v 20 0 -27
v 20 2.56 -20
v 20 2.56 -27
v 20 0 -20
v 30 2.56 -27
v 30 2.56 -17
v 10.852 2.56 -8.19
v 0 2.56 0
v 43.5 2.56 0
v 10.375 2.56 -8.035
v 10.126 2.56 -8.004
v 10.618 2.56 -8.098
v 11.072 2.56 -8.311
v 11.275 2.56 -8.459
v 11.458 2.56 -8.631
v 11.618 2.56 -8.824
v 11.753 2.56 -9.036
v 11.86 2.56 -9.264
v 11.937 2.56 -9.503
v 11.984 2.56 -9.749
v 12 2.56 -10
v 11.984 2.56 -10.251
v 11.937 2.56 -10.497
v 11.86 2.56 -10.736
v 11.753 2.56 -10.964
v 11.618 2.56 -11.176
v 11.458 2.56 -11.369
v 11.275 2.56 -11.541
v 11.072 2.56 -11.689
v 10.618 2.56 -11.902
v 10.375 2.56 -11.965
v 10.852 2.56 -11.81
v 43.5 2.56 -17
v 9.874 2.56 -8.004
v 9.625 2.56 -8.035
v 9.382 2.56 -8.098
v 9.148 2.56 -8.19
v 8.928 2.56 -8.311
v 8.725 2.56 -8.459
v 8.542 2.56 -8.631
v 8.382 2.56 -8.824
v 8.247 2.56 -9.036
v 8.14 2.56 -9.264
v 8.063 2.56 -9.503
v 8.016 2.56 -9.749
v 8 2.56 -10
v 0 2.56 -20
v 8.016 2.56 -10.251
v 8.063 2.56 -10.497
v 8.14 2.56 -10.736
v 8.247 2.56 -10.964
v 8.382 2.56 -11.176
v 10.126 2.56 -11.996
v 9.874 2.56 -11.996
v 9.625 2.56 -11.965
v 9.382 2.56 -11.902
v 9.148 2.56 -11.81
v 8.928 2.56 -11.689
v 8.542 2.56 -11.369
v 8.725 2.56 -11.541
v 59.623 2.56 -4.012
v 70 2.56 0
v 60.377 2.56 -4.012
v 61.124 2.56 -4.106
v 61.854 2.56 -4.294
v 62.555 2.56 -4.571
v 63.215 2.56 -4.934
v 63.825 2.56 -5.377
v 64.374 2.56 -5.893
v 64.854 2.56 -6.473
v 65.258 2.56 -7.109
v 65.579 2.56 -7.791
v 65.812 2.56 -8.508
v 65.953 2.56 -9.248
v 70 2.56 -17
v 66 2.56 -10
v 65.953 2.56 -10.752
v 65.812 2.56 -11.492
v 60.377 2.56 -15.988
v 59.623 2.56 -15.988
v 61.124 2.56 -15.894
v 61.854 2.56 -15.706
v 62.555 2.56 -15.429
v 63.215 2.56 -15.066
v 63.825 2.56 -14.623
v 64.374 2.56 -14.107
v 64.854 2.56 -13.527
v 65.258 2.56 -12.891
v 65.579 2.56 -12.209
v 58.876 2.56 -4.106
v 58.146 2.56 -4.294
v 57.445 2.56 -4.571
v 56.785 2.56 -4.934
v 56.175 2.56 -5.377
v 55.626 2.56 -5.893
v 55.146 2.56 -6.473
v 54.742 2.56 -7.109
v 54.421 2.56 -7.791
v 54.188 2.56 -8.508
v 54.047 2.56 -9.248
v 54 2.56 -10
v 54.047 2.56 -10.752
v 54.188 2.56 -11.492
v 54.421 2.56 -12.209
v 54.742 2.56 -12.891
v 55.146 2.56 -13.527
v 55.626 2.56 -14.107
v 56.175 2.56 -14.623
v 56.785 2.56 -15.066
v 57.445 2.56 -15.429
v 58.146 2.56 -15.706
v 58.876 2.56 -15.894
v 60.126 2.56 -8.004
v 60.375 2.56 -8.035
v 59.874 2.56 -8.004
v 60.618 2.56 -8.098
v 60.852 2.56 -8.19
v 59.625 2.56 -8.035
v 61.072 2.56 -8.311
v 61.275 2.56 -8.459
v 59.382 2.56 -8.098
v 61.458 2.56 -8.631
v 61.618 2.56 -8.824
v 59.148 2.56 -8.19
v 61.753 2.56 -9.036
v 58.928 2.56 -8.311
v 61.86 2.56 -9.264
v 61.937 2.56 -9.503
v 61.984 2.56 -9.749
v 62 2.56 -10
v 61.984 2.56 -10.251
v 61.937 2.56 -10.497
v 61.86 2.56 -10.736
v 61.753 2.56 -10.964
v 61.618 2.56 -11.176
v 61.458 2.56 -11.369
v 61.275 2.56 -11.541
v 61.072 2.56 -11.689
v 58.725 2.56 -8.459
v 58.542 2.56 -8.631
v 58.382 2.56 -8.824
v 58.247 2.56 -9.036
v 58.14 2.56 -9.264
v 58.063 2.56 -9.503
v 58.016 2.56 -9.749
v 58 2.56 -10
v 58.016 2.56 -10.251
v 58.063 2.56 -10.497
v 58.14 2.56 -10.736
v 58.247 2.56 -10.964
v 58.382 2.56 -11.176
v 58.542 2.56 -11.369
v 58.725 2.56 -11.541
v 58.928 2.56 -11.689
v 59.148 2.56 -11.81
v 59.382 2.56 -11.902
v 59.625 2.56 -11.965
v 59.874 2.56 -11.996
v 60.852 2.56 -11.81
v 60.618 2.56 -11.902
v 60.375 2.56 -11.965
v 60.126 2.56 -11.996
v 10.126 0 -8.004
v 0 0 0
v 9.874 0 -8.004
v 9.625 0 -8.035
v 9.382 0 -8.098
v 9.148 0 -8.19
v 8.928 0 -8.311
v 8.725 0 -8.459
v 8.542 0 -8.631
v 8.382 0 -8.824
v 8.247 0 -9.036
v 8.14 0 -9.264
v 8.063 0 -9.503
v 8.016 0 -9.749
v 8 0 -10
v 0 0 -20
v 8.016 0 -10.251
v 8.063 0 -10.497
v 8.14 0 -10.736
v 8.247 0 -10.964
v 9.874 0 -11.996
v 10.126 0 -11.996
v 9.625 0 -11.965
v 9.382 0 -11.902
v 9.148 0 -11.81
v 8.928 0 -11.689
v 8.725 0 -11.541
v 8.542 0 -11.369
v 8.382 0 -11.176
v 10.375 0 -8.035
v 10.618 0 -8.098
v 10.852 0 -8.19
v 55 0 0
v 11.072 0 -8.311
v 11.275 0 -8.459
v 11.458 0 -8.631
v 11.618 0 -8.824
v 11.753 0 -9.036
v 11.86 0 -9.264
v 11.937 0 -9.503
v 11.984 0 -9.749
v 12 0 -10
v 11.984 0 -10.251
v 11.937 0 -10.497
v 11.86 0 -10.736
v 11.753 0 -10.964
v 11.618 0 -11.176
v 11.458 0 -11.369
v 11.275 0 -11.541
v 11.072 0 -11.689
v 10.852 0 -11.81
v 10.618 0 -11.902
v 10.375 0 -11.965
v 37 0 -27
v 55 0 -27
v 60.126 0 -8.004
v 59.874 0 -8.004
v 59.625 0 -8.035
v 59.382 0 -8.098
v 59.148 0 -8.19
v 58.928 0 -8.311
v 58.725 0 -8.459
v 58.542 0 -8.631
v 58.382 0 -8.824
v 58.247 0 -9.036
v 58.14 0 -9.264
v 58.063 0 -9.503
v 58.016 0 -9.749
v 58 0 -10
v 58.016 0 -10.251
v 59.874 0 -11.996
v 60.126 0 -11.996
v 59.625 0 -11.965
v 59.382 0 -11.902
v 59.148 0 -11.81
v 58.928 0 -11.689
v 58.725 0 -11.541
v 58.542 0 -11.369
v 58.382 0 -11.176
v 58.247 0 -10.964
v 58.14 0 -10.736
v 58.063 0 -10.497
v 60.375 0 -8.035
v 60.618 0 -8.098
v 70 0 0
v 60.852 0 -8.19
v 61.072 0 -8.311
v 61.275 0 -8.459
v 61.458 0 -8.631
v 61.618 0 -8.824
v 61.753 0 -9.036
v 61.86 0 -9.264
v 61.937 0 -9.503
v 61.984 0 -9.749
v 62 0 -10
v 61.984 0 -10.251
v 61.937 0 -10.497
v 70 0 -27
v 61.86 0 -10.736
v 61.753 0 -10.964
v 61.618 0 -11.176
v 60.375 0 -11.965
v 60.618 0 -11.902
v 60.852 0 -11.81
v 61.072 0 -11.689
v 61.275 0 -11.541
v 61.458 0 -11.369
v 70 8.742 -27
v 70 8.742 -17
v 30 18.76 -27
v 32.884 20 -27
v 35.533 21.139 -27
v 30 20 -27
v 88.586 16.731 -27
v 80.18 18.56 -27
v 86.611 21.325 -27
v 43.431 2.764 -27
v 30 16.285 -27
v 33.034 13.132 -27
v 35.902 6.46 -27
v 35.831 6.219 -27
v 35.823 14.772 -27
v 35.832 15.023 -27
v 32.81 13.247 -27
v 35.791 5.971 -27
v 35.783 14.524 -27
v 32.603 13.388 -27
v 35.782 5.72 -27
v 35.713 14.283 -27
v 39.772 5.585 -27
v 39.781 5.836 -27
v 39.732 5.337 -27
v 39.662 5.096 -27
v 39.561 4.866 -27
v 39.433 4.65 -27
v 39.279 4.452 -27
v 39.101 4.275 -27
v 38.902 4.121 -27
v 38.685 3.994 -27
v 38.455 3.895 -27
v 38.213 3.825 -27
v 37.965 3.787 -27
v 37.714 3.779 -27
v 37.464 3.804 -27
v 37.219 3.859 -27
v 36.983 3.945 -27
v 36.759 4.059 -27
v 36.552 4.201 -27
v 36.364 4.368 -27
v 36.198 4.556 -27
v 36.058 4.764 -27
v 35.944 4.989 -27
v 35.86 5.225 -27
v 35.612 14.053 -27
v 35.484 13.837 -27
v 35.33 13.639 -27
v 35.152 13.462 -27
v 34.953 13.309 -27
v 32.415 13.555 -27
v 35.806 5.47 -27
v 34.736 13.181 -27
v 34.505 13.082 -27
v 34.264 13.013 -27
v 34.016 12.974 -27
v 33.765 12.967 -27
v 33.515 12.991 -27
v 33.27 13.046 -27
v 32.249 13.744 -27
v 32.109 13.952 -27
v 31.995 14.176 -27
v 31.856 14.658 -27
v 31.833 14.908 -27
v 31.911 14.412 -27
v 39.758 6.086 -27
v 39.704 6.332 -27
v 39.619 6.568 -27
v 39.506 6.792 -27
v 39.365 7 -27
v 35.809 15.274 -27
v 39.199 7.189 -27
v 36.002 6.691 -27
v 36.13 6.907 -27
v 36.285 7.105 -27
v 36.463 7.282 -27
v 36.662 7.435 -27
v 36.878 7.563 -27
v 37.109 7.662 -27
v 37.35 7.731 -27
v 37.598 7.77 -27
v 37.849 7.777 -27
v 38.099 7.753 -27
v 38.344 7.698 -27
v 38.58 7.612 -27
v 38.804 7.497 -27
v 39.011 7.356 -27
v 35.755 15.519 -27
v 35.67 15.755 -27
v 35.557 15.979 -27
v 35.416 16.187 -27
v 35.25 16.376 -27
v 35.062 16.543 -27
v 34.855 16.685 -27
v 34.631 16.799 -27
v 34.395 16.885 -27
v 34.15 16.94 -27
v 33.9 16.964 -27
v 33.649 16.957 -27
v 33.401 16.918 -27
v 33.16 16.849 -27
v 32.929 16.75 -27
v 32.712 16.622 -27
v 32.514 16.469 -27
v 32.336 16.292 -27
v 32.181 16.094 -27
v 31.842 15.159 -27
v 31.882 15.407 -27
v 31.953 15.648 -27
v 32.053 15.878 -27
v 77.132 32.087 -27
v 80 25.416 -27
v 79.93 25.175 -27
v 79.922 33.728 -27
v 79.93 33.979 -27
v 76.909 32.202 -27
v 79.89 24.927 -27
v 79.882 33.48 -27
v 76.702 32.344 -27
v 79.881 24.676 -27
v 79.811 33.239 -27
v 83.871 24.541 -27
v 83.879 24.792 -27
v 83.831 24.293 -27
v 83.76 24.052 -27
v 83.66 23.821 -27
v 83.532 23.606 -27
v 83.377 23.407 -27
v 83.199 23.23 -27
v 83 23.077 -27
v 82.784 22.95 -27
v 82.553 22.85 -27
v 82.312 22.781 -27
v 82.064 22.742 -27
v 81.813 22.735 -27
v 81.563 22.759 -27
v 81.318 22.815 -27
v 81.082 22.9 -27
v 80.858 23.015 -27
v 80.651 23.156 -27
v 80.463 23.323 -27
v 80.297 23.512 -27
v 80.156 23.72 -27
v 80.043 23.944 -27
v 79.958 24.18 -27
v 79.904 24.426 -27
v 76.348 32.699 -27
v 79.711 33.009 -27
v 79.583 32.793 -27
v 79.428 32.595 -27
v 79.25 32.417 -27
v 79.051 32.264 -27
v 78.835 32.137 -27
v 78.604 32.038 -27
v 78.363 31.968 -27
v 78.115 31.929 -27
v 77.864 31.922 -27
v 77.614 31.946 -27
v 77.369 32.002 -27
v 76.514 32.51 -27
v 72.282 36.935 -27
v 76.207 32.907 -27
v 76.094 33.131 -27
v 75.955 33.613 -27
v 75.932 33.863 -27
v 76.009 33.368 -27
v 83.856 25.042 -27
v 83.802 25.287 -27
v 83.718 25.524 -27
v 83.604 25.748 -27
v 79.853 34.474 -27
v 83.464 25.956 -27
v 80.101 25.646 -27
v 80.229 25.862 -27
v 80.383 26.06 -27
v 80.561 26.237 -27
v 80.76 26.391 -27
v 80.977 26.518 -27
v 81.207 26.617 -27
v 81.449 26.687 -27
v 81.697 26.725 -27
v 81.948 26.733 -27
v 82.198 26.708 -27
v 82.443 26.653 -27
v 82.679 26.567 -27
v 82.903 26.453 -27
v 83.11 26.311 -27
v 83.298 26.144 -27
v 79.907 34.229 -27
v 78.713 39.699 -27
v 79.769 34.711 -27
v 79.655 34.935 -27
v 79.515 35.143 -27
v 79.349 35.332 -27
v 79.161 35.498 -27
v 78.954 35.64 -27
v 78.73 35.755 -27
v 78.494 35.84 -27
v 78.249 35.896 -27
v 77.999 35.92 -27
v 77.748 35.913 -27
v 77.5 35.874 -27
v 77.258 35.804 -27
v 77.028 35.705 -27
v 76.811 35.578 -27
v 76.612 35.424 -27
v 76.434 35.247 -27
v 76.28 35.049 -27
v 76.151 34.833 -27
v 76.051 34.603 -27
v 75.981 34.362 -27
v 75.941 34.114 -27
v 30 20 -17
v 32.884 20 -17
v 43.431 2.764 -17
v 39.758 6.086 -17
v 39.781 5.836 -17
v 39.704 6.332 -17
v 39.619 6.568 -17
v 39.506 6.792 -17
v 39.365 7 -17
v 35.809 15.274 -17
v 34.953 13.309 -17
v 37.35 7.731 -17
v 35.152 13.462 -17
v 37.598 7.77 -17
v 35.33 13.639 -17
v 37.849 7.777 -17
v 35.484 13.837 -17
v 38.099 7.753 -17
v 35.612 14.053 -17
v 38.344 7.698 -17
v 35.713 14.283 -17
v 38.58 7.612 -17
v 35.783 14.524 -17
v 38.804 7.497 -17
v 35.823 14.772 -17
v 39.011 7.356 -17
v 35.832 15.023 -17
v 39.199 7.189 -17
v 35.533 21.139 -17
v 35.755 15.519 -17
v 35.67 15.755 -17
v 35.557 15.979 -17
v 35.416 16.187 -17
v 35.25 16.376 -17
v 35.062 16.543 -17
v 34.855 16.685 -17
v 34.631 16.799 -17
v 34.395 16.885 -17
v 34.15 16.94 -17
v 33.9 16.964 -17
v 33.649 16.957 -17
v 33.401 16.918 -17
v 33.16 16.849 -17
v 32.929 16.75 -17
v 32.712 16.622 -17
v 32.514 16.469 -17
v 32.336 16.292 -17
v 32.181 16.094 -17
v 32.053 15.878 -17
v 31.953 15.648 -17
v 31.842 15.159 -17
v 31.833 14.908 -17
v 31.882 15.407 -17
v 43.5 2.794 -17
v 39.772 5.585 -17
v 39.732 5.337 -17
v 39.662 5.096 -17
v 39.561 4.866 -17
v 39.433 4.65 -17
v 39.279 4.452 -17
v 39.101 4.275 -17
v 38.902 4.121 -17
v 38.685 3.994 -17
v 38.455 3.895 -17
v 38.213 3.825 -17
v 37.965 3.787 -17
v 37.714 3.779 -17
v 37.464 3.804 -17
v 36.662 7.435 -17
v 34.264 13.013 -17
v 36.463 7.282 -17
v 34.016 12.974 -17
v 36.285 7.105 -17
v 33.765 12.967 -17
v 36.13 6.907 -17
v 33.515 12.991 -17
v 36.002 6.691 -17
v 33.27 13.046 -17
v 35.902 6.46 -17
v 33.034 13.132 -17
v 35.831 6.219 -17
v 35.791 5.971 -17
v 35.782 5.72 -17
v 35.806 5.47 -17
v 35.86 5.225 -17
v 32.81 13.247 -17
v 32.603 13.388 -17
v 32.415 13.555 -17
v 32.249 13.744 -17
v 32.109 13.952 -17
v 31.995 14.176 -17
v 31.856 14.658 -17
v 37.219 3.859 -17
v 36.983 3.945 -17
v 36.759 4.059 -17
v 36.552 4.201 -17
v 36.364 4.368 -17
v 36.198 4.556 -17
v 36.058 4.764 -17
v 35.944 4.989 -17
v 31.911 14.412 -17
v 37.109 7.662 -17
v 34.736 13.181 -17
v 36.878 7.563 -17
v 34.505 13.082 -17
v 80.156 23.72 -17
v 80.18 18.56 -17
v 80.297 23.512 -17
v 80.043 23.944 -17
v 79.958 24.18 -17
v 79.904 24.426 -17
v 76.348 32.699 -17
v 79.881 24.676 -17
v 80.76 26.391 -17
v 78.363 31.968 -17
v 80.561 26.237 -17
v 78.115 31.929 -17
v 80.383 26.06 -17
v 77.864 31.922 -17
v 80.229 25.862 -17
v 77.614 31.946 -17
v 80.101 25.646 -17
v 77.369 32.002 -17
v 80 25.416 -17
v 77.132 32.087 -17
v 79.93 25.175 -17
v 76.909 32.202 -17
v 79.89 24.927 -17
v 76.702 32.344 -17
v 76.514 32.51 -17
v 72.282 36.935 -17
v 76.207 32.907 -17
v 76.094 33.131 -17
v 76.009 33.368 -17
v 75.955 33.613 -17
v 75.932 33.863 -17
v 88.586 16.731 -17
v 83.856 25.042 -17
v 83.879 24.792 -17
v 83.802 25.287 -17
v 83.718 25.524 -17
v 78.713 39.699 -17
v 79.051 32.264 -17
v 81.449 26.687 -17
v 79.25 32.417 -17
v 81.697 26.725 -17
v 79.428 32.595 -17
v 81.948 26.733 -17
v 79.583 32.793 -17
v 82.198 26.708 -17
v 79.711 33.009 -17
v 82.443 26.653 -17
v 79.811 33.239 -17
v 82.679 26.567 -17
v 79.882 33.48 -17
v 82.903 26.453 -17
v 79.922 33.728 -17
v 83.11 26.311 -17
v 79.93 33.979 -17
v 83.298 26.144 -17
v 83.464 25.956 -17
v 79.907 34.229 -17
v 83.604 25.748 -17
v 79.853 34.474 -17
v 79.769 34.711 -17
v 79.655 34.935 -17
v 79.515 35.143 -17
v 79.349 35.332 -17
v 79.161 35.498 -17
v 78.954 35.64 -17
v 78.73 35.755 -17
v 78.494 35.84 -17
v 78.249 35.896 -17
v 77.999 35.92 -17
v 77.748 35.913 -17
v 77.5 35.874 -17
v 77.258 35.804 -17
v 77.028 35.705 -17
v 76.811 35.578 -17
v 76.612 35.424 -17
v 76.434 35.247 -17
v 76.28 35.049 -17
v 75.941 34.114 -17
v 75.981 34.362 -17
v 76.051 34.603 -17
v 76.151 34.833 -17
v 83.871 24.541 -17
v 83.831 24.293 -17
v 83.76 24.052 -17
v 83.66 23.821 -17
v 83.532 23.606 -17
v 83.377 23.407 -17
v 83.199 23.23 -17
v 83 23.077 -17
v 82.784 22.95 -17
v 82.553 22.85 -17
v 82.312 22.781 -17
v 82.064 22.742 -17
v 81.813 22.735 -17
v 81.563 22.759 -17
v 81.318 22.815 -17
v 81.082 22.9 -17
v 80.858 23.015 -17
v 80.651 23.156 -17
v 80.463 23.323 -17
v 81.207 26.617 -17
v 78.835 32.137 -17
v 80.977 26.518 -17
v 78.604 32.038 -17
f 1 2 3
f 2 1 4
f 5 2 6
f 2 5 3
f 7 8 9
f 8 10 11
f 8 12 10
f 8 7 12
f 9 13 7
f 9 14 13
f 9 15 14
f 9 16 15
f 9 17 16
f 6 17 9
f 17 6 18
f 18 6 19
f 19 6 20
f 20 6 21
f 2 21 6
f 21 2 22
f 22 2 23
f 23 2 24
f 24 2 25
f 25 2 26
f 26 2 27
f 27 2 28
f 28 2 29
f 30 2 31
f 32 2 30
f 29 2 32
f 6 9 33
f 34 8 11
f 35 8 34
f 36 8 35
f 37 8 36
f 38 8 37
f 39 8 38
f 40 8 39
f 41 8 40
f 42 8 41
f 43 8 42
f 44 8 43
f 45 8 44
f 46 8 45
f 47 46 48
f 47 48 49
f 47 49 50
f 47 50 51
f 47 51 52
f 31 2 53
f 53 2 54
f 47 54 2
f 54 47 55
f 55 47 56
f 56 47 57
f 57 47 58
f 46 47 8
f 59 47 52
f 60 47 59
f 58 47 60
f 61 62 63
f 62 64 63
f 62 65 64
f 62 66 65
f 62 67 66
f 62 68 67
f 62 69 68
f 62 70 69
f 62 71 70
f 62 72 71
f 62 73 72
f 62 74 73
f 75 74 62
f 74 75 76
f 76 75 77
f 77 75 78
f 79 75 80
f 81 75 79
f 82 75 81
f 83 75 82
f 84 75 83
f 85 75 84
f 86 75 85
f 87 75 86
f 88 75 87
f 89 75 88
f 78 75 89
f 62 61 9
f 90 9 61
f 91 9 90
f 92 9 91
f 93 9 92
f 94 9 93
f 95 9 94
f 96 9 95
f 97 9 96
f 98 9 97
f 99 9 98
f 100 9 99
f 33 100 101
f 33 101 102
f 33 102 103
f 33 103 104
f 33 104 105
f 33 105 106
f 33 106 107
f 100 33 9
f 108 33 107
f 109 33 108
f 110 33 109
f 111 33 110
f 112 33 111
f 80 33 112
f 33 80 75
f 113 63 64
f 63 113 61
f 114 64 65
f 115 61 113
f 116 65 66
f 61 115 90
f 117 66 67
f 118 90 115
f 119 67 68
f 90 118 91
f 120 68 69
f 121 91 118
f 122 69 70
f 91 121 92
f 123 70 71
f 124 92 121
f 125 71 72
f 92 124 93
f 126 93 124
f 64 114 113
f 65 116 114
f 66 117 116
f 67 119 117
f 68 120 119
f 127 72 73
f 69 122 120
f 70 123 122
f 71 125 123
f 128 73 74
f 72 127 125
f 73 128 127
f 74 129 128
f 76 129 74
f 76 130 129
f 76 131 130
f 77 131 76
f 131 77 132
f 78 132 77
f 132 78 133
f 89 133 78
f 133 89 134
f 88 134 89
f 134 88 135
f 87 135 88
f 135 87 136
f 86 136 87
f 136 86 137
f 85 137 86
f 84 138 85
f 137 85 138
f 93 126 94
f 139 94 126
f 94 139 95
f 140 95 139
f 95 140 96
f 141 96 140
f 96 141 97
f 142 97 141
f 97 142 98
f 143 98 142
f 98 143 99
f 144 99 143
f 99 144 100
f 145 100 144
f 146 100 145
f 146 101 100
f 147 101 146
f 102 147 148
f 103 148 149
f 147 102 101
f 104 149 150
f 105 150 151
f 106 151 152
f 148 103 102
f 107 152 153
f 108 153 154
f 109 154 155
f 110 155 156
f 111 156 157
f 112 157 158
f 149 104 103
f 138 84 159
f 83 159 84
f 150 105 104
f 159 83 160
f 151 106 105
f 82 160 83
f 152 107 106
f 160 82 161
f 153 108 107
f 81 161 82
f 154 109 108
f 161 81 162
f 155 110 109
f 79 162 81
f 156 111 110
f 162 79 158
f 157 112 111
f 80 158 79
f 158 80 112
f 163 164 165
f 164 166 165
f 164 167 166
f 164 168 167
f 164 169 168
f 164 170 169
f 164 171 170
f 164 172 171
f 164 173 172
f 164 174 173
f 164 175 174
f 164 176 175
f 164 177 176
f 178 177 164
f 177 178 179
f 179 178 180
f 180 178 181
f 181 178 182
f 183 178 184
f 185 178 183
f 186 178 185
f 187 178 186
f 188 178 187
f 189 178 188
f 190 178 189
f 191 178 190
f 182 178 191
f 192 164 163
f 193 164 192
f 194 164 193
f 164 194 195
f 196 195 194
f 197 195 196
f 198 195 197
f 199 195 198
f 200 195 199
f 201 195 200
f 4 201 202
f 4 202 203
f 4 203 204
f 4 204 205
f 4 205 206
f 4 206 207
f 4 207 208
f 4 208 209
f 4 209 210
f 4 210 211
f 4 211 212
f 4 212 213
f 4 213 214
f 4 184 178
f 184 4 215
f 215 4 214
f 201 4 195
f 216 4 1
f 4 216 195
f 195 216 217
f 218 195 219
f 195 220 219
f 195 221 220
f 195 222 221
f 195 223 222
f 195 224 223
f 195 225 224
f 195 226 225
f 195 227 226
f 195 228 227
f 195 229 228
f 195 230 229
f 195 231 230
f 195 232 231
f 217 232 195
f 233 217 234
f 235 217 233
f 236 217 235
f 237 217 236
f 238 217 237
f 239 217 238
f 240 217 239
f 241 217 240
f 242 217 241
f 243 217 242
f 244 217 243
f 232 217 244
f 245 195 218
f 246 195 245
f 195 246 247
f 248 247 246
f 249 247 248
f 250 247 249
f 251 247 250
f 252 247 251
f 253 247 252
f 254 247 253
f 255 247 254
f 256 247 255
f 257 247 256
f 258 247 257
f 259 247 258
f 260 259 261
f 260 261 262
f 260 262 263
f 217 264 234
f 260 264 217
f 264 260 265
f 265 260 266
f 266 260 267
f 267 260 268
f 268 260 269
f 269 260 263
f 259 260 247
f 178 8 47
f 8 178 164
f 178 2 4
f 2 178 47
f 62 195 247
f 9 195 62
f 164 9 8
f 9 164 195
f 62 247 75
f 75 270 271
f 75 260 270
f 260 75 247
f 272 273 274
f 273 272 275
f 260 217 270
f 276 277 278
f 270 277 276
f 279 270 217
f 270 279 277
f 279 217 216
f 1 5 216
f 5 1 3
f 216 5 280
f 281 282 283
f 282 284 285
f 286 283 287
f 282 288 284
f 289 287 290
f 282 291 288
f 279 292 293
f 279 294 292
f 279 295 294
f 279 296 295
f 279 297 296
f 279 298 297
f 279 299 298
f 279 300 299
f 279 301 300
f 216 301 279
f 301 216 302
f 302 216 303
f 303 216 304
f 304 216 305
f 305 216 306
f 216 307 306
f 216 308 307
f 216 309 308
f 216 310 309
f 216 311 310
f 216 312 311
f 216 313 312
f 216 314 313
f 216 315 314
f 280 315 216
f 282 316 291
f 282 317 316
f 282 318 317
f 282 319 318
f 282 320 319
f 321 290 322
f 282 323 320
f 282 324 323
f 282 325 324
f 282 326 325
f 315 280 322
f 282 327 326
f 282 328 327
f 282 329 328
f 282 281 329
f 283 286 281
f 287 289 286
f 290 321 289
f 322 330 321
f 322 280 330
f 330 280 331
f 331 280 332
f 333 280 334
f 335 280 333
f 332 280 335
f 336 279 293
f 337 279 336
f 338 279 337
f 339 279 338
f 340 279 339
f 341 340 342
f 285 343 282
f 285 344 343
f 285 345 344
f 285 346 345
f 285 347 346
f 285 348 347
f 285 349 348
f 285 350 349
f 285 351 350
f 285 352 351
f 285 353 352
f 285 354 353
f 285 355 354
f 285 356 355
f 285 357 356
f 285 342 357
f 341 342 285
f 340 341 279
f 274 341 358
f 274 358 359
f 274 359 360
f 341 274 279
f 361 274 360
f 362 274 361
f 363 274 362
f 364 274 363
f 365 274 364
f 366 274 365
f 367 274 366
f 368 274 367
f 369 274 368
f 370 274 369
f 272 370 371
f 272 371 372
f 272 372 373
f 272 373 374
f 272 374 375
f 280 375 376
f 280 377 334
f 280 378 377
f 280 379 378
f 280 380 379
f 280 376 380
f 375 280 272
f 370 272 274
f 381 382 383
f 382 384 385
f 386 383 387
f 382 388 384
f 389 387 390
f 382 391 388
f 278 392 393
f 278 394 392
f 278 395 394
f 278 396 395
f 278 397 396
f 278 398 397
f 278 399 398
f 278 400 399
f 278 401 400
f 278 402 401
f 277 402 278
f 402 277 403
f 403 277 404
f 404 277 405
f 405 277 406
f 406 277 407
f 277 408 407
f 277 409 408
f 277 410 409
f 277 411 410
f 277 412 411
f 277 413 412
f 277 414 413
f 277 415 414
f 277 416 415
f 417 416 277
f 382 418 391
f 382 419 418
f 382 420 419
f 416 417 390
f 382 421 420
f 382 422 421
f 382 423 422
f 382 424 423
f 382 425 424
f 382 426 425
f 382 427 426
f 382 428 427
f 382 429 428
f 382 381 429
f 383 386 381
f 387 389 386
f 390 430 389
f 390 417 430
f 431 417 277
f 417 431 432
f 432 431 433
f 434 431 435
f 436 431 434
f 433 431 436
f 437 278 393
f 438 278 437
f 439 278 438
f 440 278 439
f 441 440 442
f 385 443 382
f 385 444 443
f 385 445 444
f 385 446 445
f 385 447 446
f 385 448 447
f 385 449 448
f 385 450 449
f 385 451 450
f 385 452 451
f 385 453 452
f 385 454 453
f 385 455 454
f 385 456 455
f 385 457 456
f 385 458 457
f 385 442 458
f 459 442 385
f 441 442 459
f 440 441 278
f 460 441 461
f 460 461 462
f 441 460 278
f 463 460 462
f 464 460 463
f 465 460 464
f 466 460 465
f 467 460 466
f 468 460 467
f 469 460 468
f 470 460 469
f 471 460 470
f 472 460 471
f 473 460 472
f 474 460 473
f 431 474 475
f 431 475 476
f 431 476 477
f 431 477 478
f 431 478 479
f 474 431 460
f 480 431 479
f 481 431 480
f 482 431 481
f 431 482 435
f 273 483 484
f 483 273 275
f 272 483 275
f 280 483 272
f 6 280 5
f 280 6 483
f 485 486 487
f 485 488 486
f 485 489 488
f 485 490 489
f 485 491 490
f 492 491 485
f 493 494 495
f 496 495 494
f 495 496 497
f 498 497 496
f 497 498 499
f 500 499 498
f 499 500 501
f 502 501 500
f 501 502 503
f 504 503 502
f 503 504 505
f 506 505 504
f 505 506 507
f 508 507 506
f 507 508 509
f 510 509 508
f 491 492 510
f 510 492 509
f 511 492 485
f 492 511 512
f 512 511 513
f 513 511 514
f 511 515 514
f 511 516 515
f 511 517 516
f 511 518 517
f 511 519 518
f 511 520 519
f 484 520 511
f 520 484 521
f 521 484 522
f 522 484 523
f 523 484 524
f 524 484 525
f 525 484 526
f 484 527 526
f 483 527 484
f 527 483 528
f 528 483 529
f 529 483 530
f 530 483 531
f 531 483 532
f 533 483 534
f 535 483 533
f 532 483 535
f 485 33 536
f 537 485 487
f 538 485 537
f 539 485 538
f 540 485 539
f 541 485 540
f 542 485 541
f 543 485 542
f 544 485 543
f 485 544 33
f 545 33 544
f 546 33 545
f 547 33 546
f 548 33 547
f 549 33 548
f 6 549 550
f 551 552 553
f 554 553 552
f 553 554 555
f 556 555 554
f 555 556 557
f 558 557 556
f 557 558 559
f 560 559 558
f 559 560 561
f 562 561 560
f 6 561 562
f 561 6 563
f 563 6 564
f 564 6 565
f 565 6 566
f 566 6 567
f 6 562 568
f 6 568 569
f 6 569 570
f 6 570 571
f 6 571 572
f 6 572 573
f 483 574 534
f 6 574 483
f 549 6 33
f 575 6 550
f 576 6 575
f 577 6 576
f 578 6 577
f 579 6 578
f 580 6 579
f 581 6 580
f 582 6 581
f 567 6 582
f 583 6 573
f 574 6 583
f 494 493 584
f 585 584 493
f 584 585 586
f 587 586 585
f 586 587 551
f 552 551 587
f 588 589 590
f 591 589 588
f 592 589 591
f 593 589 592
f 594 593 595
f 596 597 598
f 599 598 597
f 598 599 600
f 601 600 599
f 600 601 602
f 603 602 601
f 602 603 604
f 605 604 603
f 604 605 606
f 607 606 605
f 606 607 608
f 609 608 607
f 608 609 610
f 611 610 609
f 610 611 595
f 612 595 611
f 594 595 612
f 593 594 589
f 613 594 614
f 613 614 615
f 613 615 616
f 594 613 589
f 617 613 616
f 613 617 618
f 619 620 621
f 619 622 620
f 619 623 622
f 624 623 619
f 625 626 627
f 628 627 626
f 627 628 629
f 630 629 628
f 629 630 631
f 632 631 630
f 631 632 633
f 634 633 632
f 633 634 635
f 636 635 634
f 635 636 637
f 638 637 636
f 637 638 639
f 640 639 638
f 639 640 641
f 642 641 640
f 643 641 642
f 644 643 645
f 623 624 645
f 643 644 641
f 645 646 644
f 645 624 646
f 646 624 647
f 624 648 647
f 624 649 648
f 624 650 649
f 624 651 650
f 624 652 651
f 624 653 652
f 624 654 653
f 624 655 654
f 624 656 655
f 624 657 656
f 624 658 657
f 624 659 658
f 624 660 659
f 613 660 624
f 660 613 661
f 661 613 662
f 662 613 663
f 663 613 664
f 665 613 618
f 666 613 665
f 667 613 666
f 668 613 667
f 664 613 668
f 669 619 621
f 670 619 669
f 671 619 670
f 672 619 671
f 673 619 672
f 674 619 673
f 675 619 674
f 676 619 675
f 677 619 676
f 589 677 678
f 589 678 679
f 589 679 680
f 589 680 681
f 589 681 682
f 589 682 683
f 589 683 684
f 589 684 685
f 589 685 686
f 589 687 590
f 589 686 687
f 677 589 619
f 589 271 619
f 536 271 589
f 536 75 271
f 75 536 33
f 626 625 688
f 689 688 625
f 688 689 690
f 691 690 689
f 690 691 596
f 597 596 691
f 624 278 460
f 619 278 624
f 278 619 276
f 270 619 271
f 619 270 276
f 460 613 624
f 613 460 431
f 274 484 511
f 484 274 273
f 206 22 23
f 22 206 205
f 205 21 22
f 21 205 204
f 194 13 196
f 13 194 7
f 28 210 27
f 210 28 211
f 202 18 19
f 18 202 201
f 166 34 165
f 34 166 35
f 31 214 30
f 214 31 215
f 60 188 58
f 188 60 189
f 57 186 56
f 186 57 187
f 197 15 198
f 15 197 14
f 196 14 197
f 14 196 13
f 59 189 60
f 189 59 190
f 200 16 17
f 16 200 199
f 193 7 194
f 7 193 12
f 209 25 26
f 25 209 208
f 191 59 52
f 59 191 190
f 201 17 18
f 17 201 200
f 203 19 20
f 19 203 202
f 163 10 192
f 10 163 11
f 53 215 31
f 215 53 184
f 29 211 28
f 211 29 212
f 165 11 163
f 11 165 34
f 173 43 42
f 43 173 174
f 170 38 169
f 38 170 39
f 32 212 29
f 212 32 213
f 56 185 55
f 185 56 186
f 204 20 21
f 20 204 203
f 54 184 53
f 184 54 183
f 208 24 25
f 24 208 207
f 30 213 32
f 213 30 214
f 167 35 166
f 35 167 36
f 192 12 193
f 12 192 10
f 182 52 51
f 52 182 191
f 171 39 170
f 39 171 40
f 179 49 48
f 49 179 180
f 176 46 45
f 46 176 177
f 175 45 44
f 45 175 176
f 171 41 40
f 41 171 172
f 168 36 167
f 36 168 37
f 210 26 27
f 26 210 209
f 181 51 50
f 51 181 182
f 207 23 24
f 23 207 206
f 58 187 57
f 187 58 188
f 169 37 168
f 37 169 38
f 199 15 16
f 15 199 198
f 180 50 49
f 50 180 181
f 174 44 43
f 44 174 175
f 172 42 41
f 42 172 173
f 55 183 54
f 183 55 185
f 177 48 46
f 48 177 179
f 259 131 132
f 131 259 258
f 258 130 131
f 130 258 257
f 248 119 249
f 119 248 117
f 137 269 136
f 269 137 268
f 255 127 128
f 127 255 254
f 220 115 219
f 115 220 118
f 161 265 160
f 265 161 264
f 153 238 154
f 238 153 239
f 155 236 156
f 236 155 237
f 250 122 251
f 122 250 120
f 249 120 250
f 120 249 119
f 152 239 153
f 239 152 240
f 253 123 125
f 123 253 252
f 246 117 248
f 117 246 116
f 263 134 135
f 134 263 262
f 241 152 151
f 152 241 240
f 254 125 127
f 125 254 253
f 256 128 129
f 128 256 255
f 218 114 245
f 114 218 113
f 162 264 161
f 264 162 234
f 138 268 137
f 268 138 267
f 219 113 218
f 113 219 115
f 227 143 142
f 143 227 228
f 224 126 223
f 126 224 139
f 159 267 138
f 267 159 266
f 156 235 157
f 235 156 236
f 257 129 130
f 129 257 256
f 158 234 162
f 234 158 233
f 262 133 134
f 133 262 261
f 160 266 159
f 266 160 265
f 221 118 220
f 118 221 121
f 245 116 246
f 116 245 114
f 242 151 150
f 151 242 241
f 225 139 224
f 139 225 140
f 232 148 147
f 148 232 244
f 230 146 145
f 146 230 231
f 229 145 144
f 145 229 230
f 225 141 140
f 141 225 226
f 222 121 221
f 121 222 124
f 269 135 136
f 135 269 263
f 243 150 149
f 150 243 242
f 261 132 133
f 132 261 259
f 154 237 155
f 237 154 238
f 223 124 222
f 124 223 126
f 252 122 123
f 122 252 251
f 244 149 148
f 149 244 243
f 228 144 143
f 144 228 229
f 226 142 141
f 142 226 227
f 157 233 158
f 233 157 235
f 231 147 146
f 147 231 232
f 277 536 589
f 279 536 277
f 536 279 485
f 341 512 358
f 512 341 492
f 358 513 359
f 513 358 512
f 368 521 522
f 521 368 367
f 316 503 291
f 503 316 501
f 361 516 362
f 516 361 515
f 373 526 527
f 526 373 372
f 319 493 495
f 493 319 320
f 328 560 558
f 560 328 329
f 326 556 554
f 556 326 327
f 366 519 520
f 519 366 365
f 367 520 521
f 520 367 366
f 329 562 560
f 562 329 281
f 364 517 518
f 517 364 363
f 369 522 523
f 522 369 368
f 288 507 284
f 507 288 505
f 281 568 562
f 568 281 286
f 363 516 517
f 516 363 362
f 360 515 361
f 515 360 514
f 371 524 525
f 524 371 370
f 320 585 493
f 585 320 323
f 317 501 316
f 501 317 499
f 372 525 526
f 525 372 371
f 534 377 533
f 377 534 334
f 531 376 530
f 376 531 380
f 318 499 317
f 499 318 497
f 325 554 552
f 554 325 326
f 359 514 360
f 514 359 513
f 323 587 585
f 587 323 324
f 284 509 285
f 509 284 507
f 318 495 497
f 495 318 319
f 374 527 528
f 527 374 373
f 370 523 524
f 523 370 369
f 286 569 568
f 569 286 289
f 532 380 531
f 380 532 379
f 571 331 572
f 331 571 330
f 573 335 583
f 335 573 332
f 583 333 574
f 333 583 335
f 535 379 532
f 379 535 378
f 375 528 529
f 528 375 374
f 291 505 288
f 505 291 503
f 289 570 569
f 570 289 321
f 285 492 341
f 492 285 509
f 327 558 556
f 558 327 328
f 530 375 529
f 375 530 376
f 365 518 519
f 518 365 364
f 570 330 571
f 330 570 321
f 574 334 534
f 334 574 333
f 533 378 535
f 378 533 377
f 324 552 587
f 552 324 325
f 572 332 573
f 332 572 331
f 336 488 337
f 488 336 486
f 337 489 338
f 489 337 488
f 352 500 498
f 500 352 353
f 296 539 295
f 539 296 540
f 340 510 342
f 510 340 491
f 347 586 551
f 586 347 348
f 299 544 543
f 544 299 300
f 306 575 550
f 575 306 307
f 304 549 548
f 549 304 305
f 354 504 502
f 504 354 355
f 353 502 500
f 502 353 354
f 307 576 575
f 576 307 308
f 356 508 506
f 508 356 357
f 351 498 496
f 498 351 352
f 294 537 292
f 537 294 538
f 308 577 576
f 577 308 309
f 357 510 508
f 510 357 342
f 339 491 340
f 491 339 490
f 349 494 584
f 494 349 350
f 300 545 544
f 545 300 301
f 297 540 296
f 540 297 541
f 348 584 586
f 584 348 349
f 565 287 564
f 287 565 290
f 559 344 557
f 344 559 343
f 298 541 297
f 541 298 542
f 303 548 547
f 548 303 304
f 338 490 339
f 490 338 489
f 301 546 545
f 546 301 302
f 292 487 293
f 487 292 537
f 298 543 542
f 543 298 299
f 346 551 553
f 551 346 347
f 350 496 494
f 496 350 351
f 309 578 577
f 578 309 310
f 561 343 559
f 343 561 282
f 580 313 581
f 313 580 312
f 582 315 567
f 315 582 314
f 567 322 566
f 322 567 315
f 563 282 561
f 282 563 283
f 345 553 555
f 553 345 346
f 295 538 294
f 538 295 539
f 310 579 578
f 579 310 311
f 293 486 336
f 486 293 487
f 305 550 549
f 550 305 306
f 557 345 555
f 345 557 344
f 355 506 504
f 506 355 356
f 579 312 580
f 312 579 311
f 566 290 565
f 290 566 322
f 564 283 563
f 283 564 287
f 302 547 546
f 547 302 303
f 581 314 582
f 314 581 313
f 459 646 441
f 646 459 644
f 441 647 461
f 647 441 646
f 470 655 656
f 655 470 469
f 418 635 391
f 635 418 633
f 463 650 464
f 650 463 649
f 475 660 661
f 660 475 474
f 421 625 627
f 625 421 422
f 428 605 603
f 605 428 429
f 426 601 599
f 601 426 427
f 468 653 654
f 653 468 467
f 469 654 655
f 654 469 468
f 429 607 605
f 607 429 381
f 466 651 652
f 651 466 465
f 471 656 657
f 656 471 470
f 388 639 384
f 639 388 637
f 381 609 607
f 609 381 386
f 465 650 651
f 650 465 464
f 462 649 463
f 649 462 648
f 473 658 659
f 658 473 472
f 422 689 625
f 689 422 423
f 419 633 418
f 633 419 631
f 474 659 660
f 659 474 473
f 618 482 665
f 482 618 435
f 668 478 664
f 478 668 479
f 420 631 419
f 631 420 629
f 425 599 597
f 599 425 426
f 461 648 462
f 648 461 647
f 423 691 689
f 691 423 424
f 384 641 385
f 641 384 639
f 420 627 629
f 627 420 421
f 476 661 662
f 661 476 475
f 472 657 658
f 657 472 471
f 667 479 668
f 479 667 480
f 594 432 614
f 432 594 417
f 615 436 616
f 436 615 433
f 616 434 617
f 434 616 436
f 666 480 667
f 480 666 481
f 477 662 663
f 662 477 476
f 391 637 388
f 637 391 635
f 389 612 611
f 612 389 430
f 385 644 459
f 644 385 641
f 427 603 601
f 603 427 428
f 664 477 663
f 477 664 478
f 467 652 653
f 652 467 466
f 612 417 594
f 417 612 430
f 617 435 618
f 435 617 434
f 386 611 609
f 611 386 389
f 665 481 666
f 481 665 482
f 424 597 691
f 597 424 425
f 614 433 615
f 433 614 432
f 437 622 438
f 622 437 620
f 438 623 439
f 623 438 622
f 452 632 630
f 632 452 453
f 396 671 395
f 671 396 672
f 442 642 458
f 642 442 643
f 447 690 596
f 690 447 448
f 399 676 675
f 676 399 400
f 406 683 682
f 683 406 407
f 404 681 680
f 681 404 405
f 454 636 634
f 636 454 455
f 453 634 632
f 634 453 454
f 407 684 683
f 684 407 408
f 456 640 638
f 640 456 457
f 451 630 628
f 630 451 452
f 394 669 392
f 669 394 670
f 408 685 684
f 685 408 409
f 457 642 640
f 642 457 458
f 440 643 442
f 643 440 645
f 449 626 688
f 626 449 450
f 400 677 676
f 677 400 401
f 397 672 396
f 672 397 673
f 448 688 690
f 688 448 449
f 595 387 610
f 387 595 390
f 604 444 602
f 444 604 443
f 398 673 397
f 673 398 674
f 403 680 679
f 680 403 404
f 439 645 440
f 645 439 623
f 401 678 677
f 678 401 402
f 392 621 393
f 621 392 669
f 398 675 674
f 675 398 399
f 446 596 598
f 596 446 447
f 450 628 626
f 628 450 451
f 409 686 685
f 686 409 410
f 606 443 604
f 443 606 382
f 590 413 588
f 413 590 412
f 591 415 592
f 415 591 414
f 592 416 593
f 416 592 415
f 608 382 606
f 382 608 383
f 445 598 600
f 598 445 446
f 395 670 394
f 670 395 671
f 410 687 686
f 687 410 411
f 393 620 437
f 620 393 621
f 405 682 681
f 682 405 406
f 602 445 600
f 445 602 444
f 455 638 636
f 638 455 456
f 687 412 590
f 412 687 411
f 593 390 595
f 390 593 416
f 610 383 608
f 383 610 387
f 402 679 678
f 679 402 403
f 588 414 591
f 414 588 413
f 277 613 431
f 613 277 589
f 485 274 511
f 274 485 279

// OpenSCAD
angle=23.26;
plate_height = 2.56;
servo = false;
simple = true;
$fn = 50;

module support() {
    difference () {
        union() {
            cube([20, 20, plate_height]);
            translate([20, 0, 0]) cube([50, 27, plate_height]);
//            translate([20, 50, 0]) cube([50, 35, plate_height]);
//            translate([20, 0, 0]) cube([15, 85, plate_height]);
//            translate([0, 65, 0]) cube([20, 20, plate_height]);
            if (simple) {
                translate([30, 17, 0]) cube([40, 10, 20]);
            } else {
                translate([30, 0, 0]) cube([40, 27, 20]);
            }
            translate([37, 17, 0]) rotate(a = [0, -angle, 0])
            translate([0, 0, 20]) rotate(a = [-90, 0, 0])
                translate([0, 0, 0]) cube([54, 25, 10]);
        }
        translate([-5, -5, -10]) cube([60, 60, 10]);
        translate([0, -5, plate_height]) cube([30, 60, 60]);
        translate([0, -1, plate_height]) cube([43.5, 18, 30]);
        translate([10, 10, -1]) cylinder(h = plate_height + 2, r = 2);
        translate([60, 10, -1]) cylinder(h = plate_height + 20, r = 2);
        translate([60, 10, plate_height]) cylinder(h = 20, r = 6);
    }
}

module servo(extra_bottom = false, extra_left = false, cylinder_for_holes = false) {
    translate([37, 0, 0]) rotate(a = [0, -angle, 0])
    translate([0, 0, 20]) rotate(a = [-90, 0, 0])
    color("red") union() {
        translate([7, 0, 0]) cube([40, 20, 38]);
        if (extra_left && extra_bottom) {
            translate([7, -5, -5]) cube([40, 25, 38]);
        } else {
            if (extra_bottom) {
                translate([7, 0, -5]) cube([40, 20, 10]);
            }
            if (extra_left) {
                translate([7, -5, 0]) cube([40, 20, 38]);
            }
        }
        if (cylinder_for_holes) {
            translate([0, 0, 27]) union () {
                cube([54, 20, 2.5]);
                translate([3, 5, -11]) cylinder(h = 24, r = 2);
                translate([3, 15, -11]) cylinder(h = 24, r = 2);
                translate([51, 5, -11]) cylinder(h = 24, r = 2);
                translate([51, 15, -11]) cylinder(h = 24, r = 2);
            }
        } else {
            translate([0, 0, 27]) difference () {
                cube([54, 20, 2.5]);
                translate([3, 5, -1]) cylinder(h = 4, r = 2);
                translate([3, 15, -1]) cylinder(h = 4, r = 2);
                translate([51, 5, -1]) cylinder(h = 4, r = 2);
                translate([51, 15, -1]) cylinder(h = 4, r = 2);
            }
        }
        translate([37.5, 10, 0]) cylinder(h = 46, r = 4.5);
        translate([37.5, 10, 46]) difference() {
            cylinder(h = 2, r = 24);
            rotate(a = [0, 0, angle]) translate([-24, -24, -1]) cube([ 48, 24, 4 ]);
        }
    }
}

rotate([ -90, 0, 0 ]) if (servo) {
    support();
    servo();
} else {
    difference() {
        support();
        servo(true, true, true);
    }
}
